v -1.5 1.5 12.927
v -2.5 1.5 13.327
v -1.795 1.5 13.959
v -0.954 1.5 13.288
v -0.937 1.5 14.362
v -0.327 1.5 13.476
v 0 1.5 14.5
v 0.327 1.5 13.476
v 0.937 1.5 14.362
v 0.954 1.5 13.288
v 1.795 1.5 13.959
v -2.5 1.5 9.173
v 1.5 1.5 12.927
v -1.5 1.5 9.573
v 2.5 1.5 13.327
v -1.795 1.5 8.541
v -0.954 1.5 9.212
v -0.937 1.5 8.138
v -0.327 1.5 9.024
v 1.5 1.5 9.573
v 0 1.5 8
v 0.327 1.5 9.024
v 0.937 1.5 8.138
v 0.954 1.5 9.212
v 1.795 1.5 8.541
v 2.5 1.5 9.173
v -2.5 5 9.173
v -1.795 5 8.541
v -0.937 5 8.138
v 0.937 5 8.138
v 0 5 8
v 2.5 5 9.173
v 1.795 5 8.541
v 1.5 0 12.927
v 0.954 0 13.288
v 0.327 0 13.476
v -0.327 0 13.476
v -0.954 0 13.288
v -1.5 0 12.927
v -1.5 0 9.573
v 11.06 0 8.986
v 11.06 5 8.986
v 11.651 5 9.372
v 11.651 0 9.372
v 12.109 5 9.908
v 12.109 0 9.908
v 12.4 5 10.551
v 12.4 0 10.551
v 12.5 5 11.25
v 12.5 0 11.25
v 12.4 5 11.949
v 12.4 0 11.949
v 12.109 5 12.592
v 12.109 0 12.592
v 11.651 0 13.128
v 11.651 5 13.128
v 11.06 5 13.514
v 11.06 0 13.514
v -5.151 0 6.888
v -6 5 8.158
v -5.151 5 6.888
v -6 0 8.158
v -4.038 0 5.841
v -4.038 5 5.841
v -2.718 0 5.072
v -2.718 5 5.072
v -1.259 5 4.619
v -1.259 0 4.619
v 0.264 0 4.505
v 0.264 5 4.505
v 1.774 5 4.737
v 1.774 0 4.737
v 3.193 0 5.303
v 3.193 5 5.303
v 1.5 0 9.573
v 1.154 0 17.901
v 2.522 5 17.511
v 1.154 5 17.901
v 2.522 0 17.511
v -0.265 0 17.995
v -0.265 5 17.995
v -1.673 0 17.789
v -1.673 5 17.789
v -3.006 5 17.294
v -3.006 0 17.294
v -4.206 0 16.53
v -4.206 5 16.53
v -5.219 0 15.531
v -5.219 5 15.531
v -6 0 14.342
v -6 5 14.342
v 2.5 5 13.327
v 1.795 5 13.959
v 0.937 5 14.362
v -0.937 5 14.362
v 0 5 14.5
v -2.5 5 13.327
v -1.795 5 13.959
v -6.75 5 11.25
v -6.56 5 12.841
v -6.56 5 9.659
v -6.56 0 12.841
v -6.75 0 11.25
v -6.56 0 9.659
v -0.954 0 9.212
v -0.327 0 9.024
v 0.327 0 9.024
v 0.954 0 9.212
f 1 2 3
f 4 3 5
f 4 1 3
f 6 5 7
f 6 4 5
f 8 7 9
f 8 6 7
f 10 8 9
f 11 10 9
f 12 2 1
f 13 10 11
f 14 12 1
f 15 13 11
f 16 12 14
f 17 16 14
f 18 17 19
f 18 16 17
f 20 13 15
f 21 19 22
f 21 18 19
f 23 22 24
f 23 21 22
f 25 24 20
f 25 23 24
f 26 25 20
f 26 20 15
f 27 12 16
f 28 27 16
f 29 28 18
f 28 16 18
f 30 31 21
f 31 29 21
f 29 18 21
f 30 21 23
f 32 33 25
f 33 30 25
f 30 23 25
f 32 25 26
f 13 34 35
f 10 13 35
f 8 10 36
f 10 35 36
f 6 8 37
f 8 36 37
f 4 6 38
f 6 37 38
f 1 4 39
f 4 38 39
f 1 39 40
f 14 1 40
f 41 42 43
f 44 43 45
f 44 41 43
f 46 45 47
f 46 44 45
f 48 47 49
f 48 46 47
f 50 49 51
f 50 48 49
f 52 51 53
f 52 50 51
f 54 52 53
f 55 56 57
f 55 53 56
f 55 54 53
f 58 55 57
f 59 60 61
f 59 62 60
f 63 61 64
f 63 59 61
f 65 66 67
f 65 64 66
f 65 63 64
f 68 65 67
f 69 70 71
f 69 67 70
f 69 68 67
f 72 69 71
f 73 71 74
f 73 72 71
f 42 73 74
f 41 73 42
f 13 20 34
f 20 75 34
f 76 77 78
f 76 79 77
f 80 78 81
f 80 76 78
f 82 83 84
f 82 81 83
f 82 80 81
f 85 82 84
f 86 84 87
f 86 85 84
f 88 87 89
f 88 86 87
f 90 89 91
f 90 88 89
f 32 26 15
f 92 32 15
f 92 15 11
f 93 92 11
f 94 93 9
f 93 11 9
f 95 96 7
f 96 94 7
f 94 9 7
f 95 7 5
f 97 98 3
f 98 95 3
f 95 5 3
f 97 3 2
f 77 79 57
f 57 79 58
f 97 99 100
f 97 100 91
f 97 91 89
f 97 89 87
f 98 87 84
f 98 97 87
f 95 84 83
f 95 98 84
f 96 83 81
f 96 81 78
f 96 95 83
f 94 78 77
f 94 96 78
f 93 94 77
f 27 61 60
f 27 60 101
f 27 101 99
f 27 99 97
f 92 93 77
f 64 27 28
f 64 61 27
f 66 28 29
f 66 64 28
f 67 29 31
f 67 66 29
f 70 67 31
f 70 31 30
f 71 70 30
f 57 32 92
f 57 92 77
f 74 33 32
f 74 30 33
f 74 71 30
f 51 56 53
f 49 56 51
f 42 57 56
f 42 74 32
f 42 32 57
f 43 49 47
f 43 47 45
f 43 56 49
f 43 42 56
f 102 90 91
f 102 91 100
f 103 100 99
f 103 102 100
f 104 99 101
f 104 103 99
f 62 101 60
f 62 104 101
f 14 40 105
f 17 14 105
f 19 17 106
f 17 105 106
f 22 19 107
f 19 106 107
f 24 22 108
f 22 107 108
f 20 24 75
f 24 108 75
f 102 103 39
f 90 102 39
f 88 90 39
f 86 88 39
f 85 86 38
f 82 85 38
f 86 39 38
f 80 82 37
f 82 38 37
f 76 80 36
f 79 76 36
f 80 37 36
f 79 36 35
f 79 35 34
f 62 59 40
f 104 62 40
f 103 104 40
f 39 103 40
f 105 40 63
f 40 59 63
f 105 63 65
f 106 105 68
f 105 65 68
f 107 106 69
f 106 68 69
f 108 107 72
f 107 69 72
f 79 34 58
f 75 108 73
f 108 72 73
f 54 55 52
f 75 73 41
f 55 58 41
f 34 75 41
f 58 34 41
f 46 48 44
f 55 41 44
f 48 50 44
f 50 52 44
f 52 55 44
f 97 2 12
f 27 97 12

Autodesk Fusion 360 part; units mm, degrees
sketch "Sketch1" plane through (0, 0, 0) normal (0, 1, 0) x (1, 0, 0)
  arc A0 (-2, -13.1375) -> (2, -13.1375) centre (0, -11.25) ccw
  line L0 (-2, -13.1375) -> (-2, -9.3625)
  arc A1 (2, -9.3625) -> (-2, -9.3625) centre (0, -11.25) ccw
  line L1 (2, -9.3625) -> (2, -13.1375)
  line L2 (-2.5, -13.3267) -> (-2.5, -9.1733)
  arc A2 (2.5, -9.1733) -> (-2.5, -9.1733) centre (0, -11.25) ccw
  line L3 (2.5, -9.1733) -> (2.5, -13.3267)
  arc A3 (-2.5, -13.3267) -> (2.5, -13.3267) centre (0, -11.25) ccw
  arc A4 (-6, -14.3423) -> (6, -14.3423) centre (0, -11.25) ccw
  line L4 (6, -8.1577) -> (6, -14.3423)
  arc A5 (6, -8.1577) -> (-6, -8.1577) centre (0, -11.25) ccw
  line L5 (-6, -14.3423) -> (-6, -8.1577)
  circle A6 centre (10, -11.25) radius 2.5
  line L6 (2.5219, -17.5112) -> (11.06, -13.5142)
  line L7 (3.1933, -5.3031) -> (11.06, -8.9858)
  line L8 (1.5, -9.5729) -> (1.5, -12.9271)
  arc A7 (-1.5, -12.9271) -> (1.5, -12.9271) centre (0, -11.25) ccw
  line L9 (-1.5, -12.9271) -> (-1.5, -9.5729)
  arc A8 (1.5, -9.5729) -> (-1.5, -9.5729) centre (0, -11.25) ccw
  circle A9 centre (0, -11.25) radius 6.75
  dimension "d1" = 0.5
  dimension "d2" = -4
  dimension "d3" = 5
  dimension "d4" = 10
  dimension "d7" = 0.5
  dimension "d10" = 13.5
extrude "Extrude1" add sketch "Sketch1" along normal blind 5 contours A4 L4 A5 L5 L6 A9 | L5 A9 | A4 A5 A6 L6 L7 A9 | L4 A9 | A6
extrude "Extrude2" add sketch "Sketch1" along normal blind 1.5 contours A0 L0 A1 L1 | L2 A2 L3 A3
